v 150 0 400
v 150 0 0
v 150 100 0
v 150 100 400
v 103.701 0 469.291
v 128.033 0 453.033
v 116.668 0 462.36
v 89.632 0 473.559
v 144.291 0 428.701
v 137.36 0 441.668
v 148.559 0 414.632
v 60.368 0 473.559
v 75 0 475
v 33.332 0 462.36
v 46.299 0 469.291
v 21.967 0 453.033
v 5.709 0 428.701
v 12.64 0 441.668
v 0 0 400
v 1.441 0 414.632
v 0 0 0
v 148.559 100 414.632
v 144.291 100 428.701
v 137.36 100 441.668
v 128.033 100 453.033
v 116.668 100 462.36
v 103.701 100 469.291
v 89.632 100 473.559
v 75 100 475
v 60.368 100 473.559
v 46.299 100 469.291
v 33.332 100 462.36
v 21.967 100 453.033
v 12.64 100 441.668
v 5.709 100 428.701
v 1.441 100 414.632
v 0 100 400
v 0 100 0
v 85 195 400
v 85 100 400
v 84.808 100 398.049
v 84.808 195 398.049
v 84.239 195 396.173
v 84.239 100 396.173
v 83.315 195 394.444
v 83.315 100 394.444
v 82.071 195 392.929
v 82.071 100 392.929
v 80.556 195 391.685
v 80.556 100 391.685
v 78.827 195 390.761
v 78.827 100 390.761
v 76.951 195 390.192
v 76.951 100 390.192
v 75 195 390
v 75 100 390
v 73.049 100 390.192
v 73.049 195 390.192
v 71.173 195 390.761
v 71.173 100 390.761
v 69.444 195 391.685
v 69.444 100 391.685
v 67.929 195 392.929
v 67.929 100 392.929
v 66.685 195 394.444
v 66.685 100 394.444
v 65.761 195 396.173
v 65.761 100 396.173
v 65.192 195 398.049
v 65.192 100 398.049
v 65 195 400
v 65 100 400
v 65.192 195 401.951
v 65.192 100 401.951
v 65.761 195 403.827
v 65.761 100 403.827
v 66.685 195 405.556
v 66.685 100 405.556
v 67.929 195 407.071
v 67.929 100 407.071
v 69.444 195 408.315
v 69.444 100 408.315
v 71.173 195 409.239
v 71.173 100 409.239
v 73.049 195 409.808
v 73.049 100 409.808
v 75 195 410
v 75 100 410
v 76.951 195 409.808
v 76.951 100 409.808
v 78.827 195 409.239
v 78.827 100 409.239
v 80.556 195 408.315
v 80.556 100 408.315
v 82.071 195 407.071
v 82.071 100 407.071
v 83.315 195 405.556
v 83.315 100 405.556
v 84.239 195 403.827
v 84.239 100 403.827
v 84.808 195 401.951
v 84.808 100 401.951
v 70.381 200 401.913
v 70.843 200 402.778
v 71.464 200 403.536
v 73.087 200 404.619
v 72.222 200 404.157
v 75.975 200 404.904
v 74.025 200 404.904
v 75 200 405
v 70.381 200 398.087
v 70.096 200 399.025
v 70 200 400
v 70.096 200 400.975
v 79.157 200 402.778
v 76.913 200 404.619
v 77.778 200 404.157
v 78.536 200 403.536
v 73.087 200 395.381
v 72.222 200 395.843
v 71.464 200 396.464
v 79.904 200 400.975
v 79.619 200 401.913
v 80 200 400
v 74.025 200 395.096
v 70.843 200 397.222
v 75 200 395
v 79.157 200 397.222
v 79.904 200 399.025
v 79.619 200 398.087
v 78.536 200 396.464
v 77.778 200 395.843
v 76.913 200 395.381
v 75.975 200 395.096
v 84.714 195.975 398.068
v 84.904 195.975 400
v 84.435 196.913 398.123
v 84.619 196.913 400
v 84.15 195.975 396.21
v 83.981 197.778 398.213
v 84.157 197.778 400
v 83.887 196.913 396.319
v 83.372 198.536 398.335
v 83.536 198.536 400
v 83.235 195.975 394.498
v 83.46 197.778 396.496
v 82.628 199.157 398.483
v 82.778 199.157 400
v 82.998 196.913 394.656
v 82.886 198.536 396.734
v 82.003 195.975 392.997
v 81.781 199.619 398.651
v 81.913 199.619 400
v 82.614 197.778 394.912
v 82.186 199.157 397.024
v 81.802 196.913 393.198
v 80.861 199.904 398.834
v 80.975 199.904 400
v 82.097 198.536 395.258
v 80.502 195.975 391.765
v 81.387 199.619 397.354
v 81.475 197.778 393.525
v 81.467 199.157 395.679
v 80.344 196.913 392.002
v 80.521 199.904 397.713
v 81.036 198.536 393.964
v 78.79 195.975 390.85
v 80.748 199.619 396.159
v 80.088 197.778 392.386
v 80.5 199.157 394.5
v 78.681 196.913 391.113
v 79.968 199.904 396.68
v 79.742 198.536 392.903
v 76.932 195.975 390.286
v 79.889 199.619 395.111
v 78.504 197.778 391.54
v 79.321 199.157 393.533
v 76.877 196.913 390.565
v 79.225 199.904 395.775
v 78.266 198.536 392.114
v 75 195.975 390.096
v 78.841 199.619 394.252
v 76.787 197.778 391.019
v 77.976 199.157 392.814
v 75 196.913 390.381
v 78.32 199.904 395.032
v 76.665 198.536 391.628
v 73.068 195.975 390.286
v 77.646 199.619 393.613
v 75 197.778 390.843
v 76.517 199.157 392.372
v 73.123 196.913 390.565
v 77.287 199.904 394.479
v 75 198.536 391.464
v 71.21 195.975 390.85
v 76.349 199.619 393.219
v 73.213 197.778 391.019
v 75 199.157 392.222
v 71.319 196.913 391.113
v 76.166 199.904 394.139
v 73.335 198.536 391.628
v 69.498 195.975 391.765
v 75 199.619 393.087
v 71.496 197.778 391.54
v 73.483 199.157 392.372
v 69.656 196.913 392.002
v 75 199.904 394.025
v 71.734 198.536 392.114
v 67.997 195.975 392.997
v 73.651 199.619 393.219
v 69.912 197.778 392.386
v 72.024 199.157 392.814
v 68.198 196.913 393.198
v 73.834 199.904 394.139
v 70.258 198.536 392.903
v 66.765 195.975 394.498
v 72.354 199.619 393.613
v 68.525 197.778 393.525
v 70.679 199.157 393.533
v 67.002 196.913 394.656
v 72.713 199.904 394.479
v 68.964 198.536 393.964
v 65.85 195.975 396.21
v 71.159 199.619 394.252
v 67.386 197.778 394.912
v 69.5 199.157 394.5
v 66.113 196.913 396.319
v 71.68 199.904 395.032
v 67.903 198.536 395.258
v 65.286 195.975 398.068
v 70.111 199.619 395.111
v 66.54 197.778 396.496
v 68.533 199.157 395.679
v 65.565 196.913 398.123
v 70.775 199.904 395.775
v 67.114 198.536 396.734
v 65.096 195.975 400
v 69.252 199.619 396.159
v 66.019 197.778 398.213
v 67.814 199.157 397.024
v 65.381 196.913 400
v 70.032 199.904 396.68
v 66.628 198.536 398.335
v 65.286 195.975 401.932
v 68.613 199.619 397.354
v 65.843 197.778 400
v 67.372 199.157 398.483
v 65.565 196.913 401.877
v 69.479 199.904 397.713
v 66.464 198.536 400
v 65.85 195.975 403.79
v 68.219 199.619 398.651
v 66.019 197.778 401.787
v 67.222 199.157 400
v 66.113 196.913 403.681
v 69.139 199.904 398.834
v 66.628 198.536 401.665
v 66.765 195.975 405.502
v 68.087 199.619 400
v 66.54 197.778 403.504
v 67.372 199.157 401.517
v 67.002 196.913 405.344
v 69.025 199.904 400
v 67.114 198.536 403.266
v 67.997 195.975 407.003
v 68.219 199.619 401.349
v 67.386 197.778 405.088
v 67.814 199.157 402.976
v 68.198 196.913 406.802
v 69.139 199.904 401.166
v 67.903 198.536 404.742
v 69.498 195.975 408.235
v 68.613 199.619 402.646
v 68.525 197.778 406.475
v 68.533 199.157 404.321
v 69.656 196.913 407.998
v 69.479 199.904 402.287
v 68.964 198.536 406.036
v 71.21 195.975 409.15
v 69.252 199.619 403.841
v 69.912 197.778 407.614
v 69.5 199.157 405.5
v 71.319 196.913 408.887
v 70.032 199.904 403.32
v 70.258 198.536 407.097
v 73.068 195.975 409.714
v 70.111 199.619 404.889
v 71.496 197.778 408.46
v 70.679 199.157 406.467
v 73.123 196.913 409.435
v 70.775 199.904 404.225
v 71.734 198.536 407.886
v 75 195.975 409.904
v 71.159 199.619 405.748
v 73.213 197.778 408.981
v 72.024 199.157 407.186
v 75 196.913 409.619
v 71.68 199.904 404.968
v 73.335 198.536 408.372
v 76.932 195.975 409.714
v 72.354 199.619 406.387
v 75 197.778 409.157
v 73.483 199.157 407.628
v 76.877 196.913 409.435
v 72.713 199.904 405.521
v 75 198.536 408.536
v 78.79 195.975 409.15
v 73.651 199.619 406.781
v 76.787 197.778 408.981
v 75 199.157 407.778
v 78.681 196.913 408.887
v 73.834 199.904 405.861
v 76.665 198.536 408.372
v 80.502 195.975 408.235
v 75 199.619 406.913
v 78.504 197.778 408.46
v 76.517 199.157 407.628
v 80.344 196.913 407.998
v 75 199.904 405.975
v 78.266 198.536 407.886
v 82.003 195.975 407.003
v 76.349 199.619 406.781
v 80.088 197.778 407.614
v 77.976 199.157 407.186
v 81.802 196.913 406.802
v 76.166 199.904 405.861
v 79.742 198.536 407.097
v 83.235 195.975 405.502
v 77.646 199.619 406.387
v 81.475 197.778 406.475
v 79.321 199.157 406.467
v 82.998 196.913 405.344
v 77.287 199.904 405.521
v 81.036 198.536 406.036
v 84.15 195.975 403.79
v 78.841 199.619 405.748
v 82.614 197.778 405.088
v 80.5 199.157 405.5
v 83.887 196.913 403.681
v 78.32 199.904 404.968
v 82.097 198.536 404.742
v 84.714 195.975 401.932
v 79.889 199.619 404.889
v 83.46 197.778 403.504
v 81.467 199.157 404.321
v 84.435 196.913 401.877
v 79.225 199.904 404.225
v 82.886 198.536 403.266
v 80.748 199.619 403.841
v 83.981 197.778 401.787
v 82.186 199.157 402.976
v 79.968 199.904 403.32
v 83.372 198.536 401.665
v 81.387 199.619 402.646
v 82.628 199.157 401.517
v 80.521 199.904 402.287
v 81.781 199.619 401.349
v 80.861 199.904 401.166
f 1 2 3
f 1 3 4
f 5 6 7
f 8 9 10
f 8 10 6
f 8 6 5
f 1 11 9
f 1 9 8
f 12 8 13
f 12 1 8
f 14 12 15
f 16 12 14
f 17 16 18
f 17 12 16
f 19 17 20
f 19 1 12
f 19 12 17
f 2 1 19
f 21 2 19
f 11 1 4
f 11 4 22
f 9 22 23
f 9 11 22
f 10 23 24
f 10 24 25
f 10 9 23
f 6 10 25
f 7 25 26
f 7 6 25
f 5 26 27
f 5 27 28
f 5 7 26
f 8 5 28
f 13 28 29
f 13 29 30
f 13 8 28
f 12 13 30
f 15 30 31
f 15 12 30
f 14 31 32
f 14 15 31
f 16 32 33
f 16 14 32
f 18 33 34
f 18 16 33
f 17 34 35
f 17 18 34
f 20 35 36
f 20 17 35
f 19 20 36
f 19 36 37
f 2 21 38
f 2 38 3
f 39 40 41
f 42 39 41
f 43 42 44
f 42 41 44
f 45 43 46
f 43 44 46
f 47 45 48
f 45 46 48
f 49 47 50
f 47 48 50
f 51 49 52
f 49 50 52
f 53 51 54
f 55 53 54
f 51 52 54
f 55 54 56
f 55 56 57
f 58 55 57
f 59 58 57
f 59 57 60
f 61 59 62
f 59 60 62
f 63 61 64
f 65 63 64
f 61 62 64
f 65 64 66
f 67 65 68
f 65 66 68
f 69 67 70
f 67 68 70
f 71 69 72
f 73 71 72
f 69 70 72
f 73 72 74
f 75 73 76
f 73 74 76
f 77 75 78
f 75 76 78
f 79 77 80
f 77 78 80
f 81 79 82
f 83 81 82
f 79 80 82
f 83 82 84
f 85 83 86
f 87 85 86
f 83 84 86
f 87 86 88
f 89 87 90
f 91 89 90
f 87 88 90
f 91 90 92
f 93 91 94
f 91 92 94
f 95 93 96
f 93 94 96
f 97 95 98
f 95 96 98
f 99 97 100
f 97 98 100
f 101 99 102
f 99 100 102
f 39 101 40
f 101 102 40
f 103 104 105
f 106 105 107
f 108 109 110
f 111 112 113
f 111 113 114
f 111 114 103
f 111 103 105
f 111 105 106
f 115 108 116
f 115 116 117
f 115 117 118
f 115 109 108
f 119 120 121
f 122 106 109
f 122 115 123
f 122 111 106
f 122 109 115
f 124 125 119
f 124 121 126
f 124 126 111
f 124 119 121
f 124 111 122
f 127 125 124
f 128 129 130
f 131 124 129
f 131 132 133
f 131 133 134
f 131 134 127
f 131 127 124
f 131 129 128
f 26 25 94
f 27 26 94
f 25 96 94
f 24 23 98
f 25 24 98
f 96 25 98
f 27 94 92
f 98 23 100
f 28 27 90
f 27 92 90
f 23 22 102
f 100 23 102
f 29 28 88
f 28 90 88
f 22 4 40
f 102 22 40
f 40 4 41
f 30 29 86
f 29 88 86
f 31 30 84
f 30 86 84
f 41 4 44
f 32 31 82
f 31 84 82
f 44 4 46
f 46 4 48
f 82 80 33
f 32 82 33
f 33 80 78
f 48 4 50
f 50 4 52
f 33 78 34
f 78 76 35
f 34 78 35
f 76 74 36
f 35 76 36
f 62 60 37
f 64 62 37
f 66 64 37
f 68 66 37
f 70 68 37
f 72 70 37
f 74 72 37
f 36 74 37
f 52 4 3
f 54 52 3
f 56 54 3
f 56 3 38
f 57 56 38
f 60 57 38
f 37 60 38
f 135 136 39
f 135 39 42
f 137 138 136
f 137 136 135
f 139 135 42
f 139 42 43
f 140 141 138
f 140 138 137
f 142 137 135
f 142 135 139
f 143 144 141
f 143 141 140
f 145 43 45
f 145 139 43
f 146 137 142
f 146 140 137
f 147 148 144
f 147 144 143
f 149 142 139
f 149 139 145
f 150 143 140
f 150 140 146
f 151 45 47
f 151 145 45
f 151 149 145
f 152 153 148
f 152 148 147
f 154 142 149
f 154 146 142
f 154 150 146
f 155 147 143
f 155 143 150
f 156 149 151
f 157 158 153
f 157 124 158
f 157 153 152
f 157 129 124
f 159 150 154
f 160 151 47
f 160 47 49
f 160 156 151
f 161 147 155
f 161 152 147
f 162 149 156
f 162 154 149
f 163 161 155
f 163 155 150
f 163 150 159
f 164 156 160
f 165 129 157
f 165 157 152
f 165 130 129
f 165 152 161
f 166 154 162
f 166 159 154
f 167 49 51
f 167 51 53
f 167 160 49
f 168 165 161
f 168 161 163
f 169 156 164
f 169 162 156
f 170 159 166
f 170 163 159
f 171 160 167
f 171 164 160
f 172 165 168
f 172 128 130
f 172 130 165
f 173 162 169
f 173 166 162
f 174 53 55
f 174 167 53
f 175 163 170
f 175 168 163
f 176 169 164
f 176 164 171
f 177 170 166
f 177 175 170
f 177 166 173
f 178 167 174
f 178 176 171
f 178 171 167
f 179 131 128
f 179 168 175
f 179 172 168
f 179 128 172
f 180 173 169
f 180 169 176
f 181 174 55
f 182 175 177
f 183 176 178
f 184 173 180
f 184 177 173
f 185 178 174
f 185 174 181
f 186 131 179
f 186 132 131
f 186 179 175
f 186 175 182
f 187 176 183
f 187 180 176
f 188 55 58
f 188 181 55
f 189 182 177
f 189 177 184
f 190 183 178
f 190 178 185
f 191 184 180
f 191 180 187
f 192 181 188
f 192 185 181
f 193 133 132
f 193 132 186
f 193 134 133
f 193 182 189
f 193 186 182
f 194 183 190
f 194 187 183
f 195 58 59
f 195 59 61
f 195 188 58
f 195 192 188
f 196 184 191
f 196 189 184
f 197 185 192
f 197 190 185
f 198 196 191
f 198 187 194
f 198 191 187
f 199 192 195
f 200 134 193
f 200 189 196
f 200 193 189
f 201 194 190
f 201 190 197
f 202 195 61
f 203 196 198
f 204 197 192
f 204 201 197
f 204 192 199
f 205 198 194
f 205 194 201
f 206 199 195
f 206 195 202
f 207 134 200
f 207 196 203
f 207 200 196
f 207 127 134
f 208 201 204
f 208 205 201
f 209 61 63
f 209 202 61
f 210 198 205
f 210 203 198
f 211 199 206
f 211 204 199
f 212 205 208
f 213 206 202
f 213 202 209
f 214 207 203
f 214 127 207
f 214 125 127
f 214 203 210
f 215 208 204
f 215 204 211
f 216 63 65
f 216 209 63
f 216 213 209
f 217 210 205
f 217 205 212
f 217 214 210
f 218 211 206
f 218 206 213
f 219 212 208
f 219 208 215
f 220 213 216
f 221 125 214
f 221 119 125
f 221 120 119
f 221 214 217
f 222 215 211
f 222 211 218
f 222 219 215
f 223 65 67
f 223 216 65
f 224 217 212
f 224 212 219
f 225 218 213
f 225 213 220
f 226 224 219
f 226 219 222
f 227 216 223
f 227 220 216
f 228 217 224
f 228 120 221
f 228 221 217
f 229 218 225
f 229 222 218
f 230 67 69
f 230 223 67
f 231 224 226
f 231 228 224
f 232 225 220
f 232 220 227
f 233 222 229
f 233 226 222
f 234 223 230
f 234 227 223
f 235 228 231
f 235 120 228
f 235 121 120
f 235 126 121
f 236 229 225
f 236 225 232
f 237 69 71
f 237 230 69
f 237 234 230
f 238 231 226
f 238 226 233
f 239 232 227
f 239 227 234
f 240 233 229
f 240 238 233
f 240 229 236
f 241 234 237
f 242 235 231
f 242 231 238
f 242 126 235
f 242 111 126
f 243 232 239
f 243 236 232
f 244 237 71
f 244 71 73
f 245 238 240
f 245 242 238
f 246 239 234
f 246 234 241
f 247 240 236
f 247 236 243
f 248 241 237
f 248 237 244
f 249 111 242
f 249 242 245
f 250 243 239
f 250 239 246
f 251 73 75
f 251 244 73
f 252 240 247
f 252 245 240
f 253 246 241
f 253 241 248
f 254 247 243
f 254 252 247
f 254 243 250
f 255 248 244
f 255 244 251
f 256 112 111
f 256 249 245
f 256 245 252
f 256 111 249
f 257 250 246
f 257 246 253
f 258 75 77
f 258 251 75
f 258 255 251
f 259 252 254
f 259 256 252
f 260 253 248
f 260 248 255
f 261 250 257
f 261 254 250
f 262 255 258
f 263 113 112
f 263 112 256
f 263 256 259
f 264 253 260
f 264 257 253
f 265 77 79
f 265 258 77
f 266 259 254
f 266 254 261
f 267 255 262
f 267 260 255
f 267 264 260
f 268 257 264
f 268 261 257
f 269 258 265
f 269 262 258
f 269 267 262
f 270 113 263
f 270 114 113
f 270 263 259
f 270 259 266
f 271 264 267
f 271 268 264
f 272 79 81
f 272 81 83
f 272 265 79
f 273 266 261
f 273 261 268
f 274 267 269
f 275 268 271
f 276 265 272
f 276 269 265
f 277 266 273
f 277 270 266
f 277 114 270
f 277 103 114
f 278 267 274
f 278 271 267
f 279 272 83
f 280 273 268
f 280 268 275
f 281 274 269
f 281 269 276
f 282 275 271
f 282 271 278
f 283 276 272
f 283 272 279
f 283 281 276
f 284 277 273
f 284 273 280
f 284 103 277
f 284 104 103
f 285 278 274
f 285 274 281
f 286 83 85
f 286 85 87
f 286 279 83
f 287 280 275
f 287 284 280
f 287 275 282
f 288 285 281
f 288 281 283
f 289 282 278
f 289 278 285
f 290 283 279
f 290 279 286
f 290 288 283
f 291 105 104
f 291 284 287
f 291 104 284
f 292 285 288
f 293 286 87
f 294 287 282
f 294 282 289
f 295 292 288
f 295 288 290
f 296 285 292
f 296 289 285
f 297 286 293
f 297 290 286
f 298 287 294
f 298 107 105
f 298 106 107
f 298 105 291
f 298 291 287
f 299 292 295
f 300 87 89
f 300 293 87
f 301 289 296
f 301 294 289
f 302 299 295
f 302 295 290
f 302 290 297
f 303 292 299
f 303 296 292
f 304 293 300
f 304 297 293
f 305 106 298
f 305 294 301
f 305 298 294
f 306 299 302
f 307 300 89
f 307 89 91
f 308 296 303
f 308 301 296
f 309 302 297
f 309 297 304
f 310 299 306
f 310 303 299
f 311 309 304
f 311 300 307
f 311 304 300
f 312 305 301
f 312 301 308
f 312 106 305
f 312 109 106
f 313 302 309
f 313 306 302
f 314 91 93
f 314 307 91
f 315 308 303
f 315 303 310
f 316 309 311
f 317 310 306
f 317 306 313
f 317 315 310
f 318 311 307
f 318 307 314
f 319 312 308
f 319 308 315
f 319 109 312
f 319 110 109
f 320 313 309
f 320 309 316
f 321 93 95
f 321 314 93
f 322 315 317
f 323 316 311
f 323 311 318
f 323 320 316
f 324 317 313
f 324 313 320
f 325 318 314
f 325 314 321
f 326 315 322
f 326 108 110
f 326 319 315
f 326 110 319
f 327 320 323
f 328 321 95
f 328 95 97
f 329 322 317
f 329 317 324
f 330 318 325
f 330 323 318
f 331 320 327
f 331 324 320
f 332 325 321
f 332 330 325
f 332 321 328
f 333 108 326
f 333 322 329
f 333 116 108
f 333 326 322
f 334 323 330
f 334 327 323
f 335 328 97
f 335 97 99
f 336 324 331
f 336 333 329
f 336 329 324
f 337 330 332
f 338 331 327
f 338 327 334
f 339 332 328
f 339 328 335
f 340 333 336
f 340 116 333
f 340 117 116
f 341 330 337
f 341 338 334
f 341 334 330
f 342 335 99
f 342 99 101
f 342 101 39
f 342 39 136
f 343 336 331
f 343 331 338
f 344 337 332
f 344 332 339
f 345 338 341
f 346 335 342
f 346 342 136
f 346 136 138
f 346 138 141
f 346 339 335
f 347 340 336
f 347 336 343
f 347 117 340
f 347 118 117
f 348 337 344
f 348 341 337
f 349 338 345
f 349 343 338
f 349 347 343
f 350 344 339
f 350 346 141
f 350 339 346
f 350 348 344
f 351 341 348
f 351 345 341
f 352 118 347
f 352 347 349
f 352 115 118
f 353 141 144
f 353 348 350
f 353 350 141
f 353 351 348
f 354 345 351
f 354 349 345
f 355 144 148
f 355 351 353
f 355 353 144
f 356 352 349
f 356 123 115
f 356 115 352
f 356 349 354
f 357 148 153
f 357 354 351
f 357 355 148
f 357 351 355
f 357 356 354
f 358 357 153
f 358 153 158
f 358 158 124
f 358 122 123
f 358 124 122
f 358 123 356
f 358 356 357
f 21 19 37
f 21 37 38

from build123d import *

# Parameters (mm, degrees)
EXTRUDE_1_DEPTH = 100
SKETCH_2_R      = 10
EXTRUDE_2_DEPTH = 100
FILLET_1_R      = 5


with BuildPart() as part:
    # 草图1 → 凸台-拉伸1 (new body)
    with BuildSketch(Plane(origin=(0, 0, 0), x_dir=(1, 0, 0), z_dir=(0, 1, 0))):
        with BuildLine():
            Line((0, 0), (150, 0))
            Line((150, 0), (150, -400))
            ThreePointArc((150, -400), (75, -475), (0, -400))
            Line((0, -400), (0, 0))
        make_face()
    extrude(amount=EXTRUDE_1_DEPTH)

    # 草图2 → 凸台-拉伸2 (add)
    with BuildSketch(Plane(origin=(0, 100, 0), x_dir=(1, 0, 0), z_dir=(0, 1, 0))):
        with Locations((75, -400)):
            Circle(SKETCH_2_R)
    extrude(amount=EXTRUDE_2_DEPTH)

    # 圆角1
    fillet_1_edges = [part.edges().sort_by_distance(p)[0] for p in [
        (65, 200, 400),
    ]]
    fillet(fillet_1_edges, radius=FILLET_1_R)


solid = part.part
